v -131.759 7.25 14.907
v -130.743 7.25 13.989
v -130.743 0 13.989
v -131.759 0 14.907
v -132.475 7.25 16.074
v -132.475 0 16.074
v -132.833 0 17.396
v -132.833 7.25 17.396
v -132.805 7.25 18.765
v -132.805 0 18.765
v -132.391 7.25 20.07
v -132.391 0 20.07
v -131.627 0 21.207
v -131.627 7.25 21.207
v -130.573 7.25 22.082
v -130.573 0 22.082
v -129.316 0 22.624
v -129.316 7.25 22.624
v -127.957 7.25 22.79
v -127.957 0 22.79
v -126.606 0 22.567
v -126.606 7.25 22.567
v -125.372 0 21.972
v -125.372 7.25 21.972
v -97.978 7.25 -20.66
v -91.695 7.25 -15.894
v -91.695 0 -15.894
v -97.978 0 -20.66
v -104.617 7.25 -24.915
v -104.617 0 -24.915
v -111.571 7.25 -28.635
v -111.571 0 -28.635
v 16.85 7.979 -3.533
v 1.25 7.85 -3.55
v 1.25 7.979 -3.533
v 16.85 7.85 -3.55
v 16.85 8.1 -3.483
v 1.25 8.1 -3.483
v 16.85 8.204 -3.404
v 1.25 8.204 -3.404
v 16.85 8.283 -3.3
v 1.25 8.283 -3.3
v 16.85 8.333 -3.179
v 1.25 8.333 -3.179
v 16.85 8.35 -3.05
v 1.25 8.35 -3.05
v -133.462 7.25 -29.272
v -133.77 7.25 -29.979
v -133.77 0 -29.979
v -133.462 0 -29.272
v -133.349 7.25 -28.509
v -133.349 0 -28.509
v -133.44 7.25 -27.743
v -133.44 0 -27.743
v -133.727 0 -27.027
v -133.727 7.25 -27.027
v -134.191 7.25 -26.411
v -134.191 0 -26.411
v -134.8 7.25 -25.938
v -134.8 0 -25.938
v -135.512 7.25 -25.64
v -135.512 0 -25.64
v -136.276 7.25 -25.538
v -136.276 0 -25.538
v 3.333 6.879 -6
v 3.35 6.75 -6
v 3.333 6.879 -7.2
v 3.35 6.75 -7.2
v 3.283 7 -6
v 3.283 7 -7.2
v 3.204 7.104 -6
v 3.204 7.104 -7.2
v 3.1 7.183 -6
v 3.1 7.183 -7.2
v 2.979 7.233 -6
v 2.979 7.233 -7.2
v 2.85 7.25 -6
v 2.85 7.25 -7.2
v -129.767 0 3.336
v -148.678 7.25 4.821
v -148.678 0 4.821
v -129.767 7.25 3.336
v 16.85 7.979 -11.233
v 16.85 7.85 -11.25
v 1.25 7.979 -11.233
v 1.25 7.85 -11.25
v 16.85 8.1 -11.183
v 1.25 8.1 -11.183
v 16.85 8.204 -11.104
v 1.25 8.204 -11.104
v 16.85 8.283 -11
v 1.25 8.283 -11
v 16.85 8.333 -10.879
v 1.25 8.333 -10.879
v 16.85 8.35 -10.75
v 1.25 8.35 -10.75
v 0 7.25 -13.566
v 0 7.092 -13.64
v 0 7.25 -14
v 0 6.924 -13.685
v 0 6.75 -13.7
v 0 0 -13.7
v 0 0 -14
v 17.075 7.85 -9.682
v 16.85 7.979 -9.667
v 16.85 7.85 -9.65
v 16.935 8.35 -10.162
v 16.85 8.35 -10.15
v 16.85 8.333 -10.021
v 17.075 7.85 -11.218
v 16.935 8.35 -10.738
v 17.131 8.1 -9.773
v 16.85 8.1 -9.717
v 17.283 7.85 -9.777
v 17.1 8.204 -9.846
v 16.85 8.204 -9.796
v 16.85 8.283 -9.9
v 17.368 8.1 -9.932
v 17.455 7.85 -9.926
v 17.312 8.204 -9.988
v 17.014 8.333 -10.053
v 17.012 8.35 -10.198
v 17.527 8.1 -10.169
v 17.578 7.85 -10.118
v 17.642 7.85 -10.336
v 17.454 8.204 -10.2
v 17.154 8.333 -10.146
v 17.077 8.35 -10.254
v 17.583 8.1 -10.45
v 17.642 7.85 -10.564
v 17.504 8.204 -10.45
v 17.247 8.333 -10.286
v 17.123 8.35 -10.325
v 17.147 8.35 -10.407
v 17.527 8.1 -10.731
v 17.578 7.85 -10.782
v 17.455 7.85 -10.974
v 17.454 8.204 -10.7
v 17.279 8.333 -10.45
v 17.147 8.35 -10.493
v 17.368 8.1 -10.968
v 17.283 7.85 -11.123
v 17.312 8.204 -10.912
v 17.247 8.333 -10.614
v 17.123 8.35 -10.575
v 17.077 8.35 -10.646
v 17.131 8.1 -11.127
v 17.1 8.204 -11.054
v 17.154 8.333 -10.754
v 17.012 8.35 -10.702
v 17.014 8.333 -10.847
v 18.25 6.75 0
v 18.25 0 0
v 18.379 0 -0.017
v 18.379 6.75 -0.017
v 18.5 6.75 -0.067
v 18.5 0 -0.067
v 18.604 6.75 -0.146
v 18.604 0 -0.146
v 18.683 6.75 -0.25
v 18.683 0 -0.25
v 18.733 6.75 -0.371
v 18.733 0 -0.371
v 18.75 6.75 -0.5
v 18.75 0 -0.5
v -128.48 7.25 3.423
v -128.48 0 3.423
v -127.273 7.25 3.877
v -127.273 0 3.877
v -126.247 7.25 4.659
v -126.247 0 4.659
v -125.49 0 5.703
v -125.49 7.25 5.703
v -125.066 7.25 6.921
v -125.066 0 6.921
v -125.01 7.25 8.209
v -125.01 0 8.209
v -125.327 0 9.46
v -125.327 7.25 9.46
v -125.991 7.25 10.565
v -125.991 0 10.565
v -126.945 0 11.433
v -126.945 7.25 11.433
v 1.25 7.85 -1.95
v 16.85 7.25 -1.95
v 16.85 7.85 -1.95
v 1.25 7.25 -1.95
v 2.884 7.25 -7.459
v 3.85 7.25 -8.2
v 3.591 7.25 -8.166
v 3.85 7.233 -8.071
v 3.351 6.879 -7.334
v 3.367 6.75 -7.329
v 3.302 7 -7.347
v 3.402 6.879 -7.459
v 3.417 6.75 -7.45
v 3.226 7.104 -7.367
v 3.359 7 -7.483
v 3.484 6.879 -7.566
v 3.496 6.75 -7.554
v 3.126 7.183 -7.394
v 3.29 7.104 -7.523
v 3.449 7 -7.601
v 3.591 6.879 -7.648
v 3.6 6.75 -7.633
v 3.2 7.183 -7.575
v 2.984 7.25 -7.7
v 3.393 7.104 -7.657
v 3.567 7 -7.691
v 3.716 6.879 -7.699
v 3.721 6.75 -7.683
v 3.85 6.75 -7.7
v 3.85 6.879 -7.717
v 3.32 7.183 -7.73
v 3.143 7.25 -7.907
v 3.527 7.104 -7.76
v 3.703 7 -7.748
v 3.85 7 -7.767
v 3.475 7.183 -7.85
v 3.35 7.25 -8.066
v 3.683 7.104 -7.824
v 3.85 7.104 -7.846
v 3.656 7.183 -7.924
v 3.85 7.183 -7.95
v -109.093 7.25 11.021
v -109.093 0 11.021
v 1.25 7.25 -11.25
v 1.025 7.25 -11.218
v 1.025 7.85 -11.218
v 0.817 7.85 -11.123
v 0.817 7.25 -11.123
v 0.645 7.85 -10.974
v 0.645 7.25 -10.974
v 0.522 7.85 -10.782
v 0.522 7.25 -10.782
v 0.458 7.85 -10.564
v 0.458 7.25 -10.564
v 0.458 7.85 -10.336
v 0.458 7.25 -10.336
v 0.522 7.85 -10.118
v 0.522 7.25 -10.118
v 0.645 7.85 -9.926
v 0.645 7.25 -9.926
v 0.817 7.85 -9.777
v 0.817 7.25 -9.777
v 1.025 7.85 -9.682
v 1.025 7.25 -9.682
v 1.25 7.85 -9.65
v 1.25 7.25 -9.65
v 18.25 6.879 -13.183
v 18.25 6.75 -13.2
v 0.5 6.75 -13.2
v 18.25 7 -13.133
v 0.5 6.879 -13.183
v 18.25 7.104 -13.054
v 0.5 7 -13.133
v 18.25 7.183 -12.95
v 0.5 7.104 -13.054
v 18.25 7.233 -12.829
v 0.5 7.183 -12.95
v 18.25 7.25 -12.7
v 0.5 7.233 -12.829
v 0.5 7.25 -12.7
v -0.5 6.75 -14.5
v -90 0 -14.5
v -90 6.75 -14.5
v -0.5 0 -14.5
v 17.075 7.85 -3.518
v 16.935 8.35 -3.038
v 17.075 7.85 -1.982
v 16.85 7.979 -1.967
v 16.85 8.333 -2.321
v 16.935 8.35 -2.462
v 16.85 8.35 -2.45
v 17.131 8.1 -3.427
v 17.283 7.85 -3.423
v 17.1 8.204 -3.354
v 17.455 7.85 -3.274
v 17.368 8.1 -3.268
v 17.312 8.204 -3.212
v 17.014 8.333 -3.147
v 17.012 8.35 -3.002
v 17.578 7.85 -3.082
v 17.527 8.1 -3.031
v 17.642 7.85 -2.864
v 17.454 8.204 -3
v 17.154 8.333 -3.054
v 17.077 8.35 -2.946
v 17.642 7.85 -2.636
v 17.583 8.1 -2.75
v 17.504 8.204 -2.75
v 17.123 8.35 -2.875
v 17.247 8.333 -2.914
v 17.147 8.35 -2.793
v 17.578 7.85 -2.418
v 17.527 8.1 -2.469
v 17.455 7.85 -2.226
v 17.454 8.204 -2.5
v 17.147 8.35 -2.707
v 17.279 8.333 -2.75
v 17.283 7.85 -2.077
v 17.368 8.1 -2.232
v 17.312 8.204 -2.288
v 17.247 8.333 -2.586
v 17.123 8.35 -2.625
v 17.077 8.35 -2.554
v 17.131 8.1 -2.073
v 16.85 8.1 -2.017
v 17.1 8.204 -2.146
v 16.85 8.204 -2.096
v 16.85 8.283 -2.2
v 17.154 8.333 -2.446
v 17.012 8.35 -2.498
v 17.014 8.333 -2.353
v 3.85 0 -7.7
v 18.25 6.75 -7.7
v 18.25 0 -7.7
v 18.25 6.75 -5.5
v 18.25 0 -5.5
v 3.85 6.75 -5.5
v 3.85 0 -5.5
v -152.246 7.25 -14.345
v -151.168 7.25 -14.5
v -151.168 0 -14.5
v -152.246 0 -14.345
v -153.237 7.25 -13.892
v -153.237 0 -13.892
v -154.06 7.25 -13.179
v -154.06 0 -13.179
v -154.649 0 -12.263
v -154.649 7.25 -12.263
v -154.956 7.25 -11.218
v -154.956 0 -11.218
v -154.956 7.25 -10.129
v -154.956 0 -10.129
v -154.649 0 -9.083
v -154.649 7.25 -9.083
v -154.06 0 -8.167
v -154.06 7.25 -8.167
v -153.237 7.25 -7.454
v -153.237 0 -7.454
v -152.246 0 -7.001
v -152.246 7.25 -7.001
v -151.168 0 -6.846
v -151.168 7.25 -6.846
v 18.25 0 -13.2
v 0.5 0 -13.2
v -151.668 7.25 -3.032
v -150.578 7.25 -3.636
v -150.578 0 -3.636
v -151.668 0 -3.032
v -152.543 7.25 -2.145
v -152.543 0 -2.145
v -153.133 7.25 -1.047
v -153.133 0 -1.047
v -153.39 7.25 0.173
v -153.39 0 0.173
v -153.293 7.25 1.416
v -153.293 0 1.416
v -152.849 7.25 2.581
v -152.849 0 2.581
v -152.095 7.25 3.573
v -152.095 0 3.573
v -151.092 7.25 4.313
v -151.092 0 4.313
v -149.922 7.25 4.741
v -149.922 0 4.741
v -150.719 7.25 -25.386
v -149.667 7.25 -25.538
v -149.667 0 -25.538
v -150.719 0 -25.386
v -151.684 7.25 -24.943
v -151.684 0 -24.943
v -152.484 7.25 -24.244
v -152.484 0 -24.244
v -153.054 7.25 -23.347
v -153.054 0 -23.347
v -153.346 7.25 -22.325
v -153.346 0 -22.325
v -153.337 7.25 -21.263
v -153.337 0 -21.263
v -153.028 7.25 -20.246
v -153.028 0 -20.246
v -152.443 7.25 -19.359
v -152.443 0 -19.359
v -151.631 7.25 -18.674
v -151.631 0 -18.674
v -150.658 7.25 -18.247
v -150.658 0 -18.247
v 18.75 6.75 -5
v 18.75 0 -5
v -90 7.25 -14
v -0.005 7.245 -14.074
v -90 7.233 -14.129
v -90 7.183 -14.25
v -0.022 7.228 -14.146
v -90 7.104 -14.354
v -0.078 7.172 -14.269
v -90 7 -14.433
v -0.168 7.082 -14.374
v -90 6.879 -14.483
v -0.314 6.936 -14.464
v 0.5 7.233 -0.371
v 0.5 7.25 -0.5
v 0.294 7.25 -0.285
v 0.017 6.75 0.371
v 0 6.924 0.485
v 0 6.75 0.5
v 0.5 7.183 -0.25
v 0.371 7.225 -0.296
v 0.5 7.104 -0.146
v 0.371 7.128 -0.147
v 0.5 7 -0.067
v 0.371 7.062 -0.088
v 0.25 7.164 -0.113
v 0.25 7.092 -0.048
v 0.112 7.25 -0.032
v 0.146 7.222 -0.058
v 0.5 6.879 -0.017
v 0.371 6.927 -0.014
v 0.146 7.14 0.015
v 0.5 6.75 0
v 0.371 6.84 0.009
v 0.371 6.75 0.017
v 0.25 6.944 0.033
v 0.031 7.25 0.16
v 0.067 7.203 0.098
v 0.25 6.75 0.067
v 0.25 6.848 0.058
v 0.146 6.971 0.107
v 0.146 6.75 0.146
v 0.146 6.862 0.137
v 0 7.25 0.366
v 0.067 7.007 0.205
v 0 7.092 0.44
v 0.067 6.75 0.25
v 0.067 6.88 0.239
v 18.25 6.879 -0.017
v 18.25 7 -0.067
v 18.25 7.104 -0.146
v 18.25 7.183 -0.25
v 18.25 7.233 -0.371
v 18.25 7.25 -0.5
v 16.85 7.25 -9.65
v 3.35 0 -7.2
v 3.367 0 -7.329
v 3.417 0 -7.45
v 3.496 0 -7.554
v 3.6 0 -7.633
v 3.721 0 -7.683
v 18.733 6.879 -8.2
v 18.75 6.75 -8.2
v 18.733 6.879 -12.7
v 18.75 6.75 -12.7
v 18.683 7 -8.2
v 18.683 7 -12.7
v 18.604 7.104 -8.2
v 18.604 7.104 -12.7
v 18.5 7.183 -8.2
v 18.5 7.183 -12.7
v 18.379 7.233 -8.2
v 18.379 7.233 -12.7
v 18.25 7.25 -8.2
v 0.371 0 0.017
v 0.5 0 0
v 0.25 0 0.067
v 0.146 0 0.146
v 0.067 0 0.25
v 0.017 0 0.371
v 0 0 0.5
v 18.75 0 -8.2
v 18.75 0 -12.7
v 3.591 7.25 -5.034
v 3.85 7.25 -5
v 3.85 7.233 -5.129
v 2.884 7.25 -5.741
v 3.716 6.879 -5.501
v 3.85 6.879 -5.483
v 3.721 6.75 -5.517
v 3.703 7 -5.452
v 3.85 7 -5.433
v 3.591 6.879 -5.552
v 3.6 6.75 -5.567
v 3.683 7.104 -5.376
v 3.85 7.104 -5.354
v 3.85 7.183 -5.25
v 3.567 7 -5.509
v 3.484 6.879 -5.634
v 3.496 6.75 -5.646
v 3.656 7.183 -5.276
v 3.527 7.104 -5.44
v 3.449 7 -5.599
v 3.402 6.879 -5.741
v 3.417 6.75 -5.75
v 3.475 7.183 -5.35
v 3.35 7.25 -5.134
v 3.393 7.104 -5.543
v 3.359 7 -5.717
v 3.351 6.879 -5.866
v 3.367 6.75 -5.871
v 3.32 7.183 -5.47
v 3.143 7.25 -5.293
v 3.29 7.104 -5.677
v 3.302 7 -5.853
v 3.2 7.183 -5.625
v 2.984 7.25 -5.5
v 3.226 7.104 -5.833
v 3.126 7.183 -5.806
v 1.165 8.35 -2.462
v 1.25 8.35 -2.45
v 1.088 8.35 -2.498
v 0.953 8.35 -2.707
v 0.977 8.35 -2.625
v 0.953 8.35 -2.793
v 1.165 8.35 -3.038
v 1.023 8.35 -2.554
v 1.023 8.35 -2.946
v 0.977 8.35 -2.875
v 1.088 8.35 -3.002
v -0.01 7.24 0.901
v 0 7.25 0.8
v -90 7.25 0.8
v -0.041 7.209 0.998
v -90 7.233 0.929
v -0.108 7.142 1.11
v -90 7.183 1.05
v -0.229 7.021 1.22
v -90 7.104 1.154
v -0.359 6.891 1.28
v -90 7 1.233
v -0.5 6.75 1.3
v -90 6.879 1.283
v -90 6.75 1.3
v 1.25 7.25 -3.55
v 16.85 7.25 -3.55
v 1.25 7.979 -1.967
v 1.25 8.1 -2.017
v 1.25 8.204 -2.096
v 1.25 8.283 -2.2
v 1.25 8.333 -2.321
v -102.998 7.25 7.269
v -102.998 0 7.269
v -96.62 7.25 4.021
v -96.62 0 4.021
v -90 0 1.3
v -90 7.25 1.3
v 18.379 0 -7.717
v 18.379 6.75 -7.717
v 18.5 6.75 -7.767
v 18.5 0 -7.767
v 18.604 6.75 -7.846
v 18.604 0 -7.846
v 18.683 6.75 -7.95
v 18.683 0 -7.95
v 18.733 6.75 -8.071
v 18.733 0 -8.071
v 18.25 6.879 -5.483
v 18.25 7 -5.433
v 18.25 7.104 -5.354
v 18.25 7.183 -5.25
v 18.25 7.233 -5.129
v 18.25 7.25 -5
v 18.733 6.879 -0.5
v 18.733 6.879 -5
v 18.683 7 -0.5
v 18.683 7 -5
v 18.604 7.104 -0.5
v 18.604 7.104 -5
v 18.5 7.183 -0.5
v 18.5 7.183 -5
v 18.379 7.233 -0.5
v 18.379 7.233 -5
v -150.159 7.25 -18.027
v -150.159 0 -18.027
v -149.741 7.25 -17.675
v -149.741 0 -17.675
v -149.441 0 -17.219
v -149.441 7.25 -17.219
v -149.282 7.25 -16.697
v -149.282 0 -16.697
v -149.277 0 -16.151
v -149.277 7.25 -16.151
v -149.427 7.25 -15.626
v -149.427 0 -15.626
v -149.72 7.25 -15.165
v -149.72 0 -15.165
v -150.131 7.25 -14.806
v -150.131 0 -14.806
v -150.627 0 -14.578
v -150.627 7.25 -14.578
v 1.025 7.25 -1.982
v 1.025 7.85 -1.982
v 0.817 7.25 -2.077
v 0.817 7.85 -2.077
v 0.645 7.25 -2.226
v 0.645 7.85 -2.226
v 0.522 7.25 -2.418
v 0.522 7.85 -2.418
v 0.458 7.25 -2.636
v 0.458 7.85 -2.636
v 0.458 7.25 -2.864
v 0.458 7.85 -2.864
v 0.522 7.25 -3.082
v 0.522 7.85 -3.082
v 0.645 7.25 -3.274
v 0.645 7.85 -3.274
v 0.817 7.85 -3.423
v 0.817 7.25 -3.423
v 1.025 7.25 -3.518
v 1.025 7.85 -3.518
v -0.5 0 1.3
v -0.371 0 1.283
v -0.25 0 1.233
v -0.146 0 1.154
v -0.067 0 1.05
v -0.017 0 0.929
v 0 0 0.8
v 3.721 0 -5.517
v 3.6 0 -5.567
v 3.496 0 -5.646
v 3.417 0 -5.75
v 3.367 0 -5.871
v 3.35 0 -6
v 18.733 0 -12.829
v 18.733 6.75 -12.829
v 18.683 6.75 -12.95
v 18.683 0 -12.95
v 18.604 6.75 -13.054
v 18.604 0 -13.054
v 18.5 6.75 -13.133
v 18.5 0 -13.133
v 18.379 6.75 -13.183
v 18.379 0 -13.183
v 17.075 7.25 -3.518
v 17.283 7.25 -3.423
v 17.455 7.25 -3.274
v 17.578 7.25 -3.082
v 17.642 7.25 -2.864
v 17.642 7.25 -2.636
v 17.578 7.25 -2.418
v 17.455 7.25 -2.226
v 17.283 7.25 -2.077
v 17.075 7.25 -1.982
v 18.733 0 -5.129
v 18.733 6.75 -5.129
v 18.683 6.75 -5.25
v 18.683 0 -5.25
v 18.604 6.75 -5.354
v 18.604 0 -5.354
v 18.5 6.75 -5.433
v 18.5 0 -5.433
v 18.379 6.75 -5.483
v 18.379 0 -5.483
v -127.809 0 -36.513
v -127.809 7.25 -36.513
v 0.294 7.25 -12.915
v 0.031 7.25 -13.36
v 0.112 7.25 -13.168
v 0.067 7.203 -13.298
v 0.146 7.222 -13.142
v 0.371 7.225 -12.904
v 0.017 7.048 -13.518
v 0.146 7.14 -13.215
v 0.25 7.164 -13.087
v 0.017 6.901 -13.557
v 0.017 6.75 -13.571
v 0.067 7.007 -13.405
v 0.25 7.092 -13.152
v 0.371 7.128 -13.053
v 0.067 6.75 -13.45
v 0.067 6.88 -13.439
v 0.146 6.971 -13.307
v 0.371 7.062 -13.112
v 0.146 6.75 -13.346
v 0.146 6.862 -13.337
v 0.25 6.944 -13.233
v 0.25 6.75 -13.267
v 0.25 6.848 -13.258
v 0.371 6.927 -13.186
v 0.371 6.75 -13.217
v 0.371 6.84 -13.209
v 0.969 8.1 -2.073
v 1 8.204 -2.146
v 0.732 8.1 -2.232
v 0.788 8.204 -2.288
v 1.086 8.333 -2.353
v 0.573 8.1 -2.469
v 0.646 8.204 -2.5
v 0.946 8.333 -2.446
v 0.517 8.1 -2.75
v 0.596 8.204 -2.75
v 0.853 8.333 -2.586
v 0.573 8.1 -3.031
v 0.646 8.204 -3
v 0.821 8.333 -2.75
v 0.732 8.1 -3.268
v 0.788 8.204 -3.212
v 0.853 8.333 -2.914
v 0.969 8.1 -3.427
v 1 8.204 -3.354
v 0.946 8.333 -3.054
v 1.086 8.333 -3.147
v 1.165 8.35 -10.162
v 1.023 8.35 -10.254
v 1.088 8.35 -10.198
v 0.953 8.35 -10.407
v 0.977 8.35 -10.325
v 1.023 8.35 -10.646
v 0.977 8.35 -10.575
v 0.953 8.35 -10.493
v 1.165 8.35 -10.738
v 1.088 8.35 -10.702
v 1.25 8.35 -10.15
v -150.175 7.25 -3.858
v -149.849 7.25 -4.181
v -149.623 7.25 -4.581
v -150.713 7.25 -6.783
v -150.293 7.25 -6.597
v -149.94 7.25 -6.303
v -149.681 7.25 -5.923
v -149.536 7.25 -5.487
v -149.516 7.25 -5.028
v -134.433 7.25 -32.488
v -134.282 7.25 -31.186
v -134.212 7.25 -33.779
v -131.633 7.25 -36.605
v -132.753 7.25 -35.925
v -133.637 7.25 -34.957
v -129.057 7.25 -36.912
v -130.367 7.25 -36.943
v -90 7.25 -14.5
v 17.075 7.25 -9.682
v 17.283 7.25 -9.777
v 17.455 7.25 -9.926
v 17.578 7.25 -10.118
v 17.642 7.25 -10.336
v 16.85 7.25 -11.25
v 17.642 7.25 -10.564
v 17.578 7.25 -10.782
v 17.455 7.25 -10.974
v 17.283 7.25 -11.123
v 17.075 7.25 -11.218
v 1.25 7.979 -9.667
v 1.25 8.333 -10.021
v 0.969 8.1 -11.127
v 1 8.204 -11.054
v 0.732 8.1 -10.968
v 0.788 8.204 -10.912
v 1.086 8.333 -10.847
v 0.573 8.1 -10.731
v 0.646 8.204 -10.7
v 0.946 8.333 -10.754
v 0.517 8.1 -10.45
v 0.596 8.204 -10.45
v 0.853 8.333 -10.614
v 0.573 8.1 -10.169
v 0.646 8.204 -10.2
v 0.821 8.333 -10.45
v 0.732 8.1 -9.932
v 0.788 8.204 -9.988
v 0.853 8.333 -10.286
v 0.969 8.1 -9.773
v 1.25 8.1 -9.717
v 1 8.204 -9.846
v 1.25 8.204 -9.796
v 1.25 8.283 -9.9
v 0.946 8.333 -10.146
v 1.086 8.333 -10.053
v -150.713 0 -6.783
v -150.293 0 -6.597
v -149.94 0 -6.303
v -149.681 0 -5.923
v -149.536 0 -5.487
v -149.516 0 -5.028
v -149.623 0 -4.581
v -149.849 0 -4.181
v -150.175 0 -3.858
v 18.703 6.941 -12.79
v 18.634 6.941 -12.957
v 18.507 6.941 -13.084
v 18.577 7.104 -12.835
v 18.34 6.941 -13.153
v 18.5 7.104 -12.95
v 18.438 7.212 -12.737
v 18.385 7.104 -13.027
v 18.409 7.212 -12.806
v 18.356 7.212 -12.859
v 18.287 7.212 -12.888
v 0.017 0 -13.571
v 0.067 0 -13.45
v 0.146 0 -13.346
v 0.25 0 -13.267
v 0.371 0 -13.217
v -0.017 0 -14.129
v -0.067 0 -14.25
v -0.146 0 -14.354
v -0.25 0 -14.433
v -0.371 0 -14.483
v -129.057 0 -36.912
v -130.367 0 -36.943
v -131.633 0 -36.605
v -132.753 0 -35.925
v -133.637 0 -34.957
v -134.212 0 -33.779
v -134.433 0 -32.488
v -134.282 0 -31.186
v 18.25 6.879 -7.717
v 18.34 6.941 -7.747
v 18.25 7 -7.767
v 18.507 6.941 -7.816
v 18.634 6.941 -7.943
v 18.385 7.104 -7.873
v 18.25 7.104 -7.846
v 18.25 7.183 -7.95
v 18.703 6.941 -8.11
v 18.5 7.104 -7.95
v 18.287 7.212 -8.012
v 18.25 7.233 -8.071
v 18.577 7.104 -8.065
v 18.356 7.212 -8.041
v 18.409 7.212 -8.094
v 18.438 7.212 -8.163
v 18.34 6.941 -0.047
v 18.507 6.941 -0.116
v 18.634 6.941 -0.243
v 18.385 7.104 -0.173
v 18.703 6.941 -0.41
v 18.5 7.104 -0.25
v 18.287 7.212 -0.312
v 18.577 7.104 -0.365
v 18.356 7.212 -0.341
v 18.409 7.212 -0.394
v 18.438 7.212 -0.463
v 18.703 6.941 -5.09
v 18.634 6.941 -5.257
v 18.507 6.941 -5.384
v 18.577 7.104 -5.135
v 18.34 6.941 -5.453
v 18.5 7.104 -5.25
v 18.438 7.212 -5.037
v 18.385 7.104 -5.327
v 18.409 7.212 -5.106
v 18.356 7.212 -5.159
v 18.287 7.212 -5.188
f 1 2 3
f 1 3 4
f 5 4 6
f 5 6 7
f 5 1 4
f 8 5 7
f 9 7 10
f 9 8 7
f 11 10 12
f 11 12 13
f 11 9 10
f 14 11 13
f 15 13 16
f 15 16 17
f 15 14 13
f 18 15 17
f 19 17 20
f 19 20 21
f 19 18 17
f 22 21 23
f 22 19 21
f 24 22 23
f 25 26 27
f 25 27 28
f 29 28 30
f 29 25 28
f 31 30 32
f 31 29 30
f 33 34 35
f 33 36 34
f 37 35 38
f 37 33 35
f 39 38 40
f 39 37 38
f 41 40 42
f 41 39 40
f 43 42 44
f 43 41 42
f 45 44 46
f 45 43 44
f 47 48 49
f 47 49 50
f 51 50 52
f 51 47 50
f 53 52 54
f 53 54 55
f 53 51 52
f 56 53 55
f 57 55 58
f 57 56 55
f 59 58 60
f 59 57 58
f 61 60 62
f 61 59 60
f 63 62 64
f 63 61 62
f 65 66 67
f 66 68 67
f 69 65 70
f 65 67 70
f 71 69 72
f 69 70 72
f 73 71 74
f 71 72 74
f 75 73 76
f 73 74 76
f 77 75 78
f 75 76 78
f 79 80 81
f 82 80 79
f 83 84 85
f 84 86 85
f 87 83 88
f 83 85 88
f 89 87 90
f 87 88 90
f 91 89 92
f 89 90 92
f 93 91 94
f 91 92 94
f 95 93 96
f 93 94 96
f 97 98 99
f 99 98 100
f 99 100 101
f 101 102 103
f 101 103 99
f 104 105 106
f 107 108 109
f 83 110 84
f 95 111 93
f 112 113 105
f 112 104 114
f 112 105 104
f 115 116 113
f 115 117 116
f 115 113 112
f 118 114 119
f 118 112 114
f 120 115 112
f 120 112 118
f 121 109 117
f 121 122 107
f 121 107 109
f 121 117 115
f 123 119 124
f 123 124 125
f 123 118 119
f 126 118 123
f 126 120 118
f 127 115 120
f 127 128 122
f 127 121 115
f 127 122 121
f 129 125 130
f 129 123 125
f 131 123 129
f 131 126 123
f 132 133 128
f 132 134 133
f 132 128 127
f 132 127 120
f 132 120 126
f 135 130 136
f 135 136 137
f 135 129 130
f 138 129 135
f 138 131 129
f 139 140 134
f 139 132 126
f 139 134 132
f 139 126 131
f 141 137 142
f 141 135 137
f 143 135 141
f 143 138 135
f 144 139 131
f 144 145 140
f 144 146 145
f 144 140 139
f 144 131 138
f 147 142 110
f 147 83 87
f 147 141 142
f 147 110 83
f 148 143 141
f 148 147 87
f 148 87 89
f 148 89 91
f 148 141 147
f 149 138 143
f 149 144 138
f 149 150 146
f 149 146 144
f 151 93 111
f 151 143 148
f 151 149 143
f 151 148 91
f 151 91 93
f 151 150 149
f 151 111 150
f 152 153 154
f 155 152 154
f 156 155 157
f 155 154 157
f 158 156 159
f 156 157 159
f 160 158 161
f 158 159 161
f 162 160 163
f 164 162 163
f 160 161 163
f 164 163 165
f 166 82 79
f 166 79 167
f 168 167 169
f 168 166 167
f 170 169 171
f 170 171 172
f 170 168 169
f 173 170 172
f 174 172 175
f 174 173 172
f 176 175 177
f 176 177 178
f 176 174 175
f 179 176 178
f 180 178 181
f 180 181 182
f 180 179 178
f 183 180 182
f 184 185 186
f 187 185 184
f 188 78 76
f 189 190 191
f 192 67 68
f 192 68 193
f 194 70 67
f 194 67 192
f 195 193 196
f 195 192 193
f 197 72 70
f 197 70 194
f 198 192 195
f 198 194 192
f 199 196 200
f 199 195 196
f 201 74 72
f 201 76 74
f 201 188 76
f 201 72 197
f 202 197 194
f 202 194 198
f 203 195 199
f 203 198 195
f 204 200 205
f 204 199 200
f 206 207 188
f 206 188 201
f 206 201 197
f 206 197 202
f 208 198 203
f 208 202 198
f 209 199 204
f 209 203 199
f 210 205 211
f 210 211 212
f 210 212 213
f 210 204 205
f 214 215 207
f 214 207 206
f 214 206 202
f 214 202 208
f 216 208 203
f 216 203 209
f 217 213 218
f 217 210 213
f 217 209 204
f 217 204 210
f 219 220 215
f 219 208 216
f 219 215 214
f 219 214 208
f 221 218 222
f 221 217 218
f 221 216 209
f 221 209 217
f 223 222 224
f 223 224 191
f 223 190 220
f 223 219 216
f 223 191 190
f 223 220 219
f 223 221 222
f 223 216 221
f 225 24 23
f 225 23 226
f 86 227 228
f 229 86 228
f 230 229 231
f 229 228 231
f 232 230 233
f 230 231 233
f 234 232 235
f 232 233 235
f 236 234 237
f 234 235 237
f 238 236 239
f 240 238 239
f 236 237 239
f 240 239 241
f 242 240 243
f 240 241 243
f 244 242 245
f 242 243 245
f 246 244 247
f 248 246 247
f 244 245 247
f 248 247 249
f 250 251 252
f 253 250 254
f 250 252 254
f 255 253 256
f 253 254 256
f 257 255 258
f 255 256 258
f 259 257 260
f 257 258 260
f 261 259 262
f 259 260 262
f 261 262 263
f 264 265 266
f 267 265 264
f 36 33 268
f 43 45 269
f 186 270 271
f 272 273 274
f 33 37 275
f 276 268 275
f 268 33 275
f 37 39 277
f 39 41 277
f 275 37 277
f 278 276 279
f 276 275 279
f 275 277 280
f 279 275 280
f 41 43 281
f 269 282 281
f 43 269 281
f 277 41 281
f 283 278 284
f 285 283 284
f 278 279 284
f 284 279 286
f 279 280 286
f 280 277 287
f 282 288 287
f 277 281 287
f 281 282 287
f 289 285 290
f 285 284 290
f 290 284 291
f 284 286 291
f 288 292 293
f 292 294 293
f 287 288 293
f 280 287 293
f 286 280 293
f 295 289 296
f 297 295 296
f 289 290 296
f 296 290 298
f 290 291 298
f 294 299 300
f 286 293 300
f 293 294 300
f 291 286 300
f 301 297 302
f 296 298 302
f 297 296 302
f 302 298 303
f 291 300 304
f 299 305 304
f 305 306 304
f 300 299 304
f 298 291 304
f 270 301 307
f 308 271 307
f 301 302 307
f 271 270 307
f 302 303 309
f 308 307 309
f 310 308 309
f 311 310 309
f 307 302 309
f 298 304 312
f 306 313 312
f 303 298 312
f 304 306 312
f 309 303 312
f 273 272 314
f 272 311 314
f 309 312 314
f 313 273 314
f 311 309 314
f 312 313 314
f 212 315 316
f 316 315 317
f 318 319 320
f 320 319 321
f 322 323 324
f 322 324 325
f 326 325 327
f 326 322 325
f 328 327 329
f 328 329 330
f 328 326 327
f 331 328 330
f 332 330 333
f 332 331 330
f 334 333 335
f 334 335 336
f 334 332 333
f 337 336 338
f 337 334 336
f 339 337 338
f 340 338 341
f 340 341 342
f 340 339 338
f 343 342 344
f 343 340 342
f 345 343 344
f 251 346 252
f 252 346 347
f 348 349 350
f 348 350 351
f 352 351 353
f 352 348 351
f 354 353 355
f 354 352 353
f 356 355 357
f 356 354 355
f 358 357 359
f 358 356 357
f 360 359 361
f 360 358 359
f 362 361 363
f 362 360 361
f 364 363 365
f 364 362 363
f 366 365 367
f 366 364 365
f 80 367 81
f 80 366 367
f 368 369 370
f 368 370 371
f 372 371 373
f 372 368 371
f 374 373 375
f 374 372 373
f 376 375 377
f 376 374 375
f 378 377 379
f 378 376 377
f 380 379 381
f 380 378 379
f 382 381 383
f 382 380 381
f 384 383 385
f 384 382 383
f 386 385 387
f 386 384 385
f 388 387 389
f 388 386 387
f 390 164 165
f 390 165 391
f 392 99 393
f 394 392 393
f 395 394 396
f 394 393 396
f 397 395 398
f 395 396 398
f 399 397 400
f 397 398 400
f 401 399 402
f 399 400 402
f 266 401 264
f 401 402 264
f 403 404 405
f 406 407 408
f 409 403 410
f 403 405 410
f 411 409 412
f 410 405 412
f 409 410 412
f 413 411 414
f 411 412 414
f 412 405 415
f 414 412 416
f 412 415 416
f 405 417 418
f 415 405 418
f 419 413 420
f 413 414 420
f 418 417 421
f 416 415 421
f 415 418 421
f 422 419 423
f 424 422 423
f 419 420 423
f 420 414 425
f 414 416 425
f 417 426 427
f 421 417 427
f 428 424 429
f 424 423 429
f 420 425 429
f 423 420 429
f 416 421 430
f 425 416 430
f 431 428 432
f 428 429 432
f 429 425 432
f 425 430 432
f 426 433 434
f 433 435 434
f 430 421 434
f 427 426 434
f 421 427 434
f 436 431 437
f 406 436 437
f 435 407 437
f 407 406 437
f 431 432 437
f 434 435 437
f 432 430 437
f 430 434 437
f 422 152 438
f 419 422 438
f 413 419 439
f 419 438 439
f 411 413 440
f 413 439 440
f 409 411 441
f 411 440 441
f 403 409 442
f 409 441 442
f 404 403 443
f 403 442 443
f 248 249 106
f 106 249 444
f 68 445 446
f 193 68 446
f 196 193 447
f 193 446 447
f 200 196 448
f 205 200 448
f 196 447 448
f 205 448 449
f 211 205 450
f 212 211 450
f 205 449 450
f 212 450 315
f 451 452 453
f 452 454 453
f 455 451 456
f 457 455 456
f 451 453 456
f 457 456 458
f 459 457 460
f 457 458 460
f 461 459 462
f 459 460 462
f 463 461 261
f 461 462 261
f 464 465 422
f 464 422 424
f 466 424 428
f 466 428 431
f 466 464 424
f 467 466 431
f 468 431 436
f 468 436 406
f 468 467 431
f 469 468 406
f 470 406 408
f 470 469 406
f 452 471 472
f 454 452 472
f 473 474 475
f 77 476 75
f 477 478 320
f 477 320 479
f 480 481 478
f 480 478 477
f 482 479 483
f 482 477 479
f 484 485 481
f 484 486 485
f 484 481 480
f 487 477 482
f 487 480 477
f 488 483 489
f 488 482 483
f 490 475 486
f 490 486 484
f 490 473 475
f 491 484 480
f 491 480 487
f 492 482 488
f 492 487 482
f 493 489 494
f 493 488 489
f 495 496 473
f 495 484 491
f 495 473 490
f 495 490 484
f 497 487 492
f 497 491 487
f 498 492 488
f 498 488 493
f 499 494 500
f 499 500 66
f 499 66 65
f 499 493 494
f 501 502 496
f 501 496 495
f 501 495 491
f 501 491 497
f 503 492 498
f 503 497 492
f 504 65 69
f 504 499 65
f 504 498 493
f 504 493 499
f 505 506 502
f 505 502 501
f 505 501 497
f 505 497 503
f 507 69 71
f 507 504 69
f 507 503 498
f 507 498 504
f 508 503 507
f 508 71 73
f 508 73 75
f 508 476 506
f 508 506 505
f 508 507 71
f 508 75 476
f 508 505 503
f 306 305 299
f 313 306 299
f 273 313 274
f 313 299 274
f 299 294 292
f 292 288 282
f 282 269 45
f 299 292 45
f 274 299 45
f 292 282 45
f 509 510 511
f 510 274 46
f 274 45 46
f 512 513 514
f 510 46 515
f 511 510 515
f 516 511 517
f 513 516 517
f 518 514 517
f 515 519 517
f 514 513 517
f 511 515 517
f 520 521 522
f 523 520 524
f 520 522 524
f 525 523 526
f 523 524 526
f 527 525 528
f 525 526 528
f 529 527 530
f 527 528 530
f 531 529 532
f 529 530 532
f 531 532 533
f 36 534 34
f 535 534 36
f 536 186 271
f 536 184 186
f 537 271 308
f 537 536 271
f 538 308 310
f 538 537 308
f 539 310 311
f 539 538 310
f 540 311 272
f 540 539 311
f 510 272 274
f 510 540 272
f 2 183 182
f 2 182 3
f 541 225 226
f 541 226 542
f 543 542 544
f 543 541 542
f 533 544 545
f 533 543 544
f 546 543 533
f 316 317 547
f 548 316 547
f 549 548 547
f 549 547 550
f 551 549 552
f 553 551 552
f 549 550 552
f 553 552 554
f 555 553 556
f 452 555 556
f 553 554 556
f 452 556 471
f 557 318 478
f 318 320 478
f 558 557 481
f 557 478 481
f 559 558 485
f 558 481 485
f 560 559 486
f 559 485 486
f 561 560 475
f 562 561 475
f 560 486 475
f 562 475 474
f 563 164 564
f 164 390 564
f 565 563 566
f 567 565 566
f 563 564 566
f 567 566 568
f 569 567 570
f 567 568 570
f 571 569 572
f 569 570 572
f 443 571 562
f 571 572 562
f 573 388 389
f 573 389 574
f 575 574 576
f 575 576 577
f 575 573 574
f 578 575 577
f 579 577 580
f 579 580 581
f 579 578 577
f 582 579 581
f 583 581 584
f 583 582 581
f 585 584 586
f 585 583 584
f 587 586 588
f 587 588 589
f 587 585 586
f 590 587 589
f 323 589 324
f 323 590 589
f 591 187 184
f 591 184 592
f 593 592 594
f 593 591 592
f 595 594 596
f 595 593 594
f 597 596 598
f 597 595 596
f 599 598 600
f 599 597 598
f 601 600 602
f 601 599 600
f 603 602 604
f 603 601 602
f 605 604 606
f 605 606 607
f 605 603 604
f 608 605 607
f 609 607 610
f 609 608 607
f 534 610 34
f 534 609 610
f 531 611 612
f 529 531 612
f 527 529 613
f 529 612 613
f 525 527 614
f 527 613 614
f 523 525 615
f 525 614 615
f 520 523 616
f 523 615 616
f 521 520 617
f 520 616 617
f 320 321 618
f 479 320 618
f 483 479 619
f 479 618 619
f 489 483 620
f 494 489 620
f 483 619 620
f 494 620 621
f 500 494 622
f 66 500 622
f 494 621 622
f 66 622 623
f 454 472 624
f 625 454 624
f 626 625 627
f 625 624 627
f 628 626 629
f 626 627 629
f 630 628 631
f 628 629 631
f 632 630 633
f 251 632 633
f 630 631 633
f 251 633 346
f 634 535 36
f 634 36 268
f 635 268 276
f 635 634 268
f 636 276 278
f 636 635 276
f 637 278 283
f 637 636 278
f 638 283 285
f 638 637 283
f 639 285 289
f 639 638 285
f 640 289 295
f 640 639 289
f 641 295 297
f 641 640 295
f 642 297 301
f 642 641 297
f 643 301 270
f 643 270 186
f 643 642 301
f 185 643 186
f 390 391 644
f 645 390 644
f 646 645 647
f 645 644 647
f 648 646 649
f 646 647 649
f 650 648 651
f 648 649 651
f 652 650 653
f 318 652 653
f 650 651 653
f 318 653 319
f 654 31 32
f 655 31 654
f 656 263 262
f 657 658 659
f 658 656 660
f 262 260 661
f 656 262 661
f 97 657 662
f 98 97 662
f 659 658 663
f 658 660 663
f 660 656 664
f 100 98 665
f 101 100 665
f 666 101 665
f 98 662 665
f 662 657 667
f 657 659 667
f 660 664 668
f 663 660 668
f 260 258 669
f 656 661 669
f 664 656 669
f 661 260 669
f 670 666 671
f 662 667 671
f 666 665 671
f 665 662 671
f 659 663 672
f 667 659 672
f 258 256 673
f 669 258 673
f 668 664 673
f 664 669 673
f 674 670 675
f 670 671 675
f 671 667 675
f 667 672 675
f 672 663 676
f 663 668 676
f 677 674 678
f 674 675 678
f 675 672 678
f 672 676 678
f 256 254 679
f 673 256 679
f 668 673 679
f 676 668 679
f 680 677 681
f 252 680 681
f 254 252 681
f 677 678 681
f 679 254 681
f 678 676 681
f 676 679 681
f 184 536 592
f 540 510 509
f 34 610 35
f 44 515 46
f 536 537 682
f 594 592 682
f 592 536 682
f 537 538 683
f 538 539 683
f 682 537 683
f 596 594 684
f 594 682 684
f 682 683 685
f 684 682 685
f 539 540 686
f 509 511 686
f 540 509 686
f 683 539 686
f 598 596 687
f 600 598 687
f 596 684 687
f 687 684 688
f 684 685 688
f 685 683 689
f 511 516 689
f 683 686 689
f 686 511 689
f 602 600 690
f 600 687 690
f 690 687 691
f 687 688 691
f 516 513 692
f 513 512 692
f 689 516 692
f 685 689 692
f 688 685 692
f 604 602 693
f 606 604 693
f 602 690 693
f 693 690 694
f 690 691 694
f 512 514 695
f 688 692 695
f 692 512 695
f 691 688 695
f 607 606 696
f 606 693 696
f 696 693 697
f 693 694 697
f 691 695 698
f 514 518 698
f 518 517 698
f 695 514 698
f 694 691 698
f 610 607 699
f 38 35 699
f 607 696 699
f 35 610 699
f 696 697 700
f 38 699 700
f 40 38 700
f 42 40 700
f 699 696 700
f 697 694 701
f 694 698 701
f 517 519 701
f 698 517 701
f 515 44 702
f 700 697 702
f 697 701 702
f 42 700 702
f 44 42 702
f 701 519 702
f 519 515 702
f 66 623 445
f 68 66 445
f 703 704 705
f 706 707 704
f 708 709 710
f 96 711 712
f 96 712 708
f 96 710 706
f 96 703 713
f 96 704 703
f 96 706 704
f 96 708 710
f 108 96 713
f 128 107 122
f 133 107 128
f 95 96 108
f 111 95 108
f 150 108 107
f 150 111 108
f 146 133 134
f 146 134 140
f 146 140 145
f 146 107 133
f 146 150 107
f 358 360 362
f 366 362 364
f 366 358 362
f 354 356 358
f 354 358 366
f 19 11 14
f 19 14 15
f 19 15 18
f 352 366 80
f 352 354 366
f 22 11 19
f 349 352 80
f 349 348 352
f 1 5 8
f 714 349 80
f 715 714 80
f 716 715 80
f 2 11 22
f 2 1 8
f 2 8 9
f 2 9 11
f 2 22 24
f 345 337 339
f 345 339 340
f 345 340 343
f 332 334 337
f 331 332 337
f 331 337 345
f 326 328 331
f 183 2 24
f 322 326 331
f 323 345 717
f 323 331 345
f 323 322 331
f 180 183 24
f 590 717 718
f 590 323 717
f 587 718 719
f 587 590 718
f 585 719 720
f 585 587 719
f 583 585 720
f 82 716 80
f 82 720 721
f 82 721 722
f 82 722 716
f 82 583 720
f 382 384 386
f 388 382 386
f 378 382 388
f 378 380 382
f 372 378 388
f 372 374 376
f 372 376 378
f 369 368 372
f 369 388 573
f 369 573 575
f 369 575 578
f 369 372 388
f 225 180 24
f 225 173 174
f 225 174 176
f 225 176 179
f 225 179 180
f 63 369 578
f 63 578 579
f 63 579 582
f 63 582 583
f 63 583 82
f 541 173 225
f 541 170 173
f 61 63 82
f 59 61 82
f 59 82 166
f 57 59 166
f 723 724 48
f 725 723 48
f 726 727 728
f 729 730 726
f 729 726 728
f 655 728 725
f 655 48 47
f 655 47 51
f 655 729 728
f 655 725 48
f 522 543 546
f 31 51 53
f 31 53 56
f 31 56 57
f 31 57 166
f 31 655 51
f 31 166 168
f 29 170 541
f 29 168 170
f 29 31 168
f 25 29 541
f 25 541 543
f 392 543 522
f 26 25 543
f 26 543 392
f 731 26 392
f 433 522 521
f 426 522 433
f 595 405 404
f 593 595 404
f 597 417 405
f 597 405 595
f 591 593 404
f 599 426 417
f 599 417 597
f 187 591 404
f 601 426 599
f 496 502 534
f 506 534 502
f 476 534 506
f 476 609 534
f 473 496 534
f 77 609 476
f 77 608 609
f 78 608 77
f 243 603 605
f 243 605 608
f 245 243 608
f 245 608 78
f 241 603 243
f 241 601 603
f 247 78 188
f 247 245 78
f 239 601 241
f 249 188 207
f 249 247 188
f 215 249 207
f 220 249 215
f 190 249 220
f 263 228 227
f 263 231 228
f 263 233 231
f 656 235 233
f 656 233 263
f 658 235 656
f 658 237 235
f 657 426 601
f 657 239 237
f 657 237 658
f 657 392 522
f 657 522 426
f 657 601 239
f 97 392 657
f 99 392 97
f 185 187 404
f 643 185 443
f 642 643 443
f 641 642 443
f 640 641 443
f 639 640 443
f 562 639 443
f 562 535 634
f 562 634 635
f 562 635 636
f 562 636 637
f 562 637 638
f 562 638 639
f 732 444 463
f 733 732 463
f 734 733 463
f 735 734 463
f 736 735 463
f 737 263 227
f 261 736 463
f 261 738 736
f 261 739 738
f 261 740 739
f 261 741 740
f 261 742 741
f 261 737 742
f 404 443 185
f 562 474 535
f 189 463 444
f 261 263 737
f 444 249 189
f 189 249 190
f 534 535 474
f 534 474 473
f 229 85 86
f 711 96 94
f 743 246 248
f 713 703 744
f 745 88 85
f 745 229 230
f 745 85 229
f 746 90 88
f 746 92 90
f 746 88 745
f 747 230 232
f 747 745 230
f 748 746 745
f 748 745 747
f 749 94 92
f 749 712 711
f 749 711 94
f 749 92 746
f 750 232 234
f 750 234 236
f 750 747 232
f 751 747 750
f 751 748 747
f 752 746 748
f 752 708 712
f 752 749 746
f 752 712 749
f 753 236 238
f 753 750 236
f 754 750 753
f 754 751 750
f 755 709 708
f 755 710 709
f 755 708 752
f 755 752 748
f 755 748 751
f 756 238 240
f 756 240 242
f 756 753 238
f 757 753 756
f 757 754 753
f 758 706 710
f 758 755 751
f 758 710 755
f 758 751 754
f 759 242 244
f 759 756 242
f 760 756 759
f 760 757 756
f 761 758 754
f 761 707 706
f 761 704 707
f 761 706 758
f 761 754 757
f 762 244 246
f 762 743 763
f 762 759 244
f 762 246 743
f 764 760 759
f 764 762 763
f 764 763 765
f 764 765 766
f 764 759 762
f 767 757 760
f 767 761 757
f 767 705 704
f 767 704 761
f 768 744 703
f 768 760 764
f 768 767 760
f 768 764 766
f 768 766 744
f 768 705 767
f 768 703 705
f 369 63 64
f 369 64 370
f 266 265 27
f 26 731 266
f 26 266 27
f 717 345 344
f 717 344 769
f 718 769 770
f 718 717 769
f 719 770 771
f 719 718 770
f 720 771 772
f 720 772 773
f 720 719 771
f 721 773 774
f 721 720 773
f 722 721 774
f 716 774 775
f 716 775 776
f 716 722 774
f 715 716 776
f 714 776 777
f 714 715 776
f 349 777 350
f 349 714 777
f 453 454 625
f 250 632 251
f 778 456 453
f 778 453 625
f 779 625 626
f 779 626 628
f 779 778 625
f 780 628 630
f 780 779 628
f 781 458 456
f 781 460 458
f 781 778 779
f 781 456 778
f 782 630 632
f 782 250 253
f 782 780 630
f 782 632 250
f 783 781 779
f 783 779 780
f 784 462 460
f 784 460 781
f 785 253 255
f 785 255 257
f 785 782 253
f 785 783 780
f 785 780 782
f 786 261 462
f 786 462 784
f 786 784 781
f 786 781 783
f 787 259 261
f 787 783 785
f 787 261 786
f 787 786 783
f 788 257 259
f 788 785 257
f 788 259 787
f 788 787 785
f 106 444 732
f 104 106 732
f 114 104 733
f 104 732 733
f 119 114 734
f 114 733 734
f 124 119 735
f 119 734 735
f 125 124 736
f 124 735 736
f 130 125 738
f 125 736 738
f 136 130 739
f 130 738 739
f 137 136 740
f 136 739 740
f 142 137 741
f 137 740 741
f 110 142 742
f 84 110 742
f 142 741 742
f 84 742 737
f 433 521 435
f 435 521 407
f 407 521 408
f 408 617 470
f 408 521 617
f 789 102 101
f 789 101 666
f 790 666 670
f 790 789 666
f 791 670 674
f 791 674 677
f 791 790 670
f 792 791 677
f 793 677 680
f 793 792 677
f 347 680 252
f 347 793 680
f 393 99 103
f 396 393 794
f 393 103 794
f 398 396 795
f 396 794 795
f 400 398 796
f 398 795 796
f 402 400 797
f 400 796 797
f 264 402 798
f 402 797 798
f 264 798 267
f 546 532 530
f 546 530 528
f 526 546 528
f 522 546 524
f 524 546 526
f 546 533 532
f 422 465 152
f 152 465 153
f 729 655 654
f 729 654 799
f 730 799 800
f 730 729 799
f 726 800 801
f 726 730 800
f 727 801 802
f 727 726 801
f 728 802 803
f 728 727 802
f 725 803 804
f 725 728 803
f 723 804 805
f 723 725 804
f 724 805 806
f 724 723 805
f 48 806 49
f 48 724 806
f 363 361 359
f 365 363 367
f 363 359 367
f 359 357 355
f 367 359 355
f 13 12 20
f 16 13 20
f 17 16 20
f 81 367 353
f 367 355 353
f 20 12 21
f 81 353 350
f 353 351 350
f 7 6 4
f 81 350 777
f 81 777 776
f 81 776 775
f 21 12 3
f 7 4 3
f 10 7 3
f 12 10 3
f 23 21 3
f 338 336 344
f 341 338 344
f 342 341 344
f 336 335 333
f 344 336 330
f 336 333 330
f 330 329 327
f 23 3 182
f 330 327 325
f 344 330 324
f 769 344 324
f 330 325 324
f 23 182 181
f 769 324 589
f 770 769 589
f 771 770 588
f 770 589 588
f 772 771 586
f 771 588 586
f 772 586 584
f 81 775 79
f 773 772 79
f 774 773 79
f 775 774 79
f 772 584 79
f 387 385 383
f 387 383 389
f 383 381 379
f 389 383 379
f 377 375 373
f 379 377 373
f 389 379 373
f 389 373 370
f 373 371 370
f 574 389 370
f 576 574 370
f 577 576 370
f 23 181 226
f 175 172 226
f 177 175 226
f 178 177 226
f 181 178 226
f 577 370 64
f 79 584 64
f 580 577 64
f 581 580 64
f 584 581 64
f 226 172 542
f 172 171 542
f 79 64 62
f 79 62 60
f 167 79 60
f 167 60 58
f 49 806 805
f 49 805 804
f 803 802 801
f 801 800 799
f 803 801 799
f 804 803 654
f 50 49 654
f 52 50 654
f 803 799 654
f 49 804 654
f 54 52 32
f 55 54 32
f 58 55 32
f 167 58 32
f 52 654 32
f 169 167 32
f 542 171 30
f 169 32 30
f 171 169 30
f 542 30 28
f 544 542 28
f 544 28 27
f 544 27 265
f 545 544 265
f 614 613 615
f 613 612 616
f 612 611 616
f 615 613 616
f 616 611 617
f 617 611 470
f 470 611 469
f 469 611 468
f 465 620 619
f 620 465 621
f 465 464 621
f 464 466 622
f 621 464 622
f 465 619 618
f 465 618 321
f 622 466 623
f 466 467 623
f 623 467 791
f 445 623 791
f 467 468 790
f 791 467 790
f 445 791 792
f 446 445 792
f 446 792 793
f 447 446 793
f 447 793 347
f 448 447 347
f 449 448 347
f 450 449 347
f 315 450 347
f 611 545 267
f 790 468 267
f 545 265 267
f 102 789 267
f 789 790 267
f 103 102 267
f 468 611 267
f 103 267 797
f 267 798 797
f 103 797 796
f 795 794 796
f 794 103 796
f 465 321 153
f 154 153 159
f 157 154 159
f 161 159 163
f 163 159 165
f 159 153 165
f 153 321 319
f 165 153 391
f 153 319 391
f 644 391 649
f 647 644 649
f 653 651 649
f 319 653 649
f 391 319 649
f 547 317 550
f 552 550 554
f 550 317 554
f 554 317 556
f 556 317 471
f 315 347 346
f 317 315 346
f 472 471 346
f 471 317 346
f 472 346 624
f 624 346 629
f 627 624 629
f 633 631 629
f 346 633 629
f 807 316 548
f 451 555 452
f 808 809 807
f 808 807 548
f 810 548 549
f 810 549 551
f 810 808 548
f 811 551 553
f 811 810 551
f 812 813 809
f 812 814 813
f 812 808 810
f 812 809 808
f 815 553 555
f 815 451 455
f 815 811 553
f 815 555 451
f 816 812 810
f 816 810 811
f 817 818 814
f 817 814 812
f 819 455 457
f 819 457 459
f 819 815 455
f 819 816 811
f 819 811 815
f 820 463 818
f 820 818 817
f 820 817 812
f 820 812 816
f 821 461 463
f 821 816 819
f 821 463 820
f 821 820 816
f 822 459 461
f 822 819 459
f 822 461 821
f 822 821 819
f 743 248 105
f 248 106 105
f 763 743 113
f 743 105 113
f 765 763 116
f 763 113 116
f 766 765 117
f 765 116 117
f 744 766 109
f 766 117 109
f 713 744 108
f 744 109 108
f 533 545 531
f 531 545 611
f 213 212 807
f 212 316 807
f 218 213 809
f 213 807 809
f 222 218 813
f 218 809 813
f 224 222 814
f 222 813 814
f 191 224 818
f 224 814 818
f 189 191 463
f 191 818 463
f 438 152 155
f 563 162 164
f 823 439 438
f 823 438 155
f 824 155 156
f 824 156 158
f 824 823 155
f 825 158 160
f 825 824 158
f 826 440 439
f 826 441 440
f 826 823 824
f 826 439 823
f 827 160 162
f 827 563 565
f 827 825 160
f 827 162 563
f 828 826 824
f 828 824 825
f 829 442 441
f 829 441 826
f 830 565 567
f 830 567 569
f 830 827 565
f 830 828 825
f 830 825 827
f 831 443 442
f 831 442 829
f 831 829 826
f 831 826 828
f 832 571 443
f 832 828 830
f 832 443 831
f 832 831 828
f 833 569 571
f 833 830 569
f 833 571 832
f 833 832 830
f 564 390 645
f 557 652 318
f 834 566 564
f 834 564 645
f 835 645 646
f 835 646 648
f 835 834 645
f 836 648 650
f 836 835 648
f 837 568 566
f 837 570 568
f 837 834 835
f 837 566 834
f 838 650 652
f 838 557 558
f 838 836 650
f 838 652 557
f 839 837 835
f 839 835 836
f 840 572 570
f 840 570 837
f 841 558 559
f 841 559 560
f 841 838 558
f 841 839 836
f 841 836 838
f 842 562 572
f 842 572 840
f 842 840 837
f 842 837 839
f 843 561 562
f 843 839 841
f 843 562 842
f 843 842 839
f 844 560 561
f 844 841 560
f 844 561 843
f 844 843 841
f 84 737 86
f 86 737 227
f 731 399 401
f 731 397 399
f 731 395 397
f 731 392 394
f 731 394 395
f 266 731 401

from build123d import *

# Parameters (mm, degrees)
BOSS_EXTRUDE1_DEPTH = 7.25
BOSS_EXTRUDE2_DEPTH = 1.1
FILLET1_R           = 0.5
SKETCH4_W           = 90
SKETCH4_H           = 15.8
BOSS_EXTRUDE3_DEPTH = 7.25
FILLET3_R           = 0.5
BOSS_EXTRUDE4_DEPTH = 7.25


with BuildPart() as part:
    # Sketch1 → Boss-Extrude1 (new body)
    with BuildSketch(Plane(origin=(0, 0, 0), x_dir=(1, 0, 0), z_dir=(0, 1, 0))):
        with BuildLine():
            Line((0, 0), (18.25, 0))
            ThreePointArc((18.25, 0), (18.603553391, 0.146446609), (18.75, 0.5))
            Line((18.75, 0.5), (18.75, 5))
            ThreePointArc((18.75, 5), (18.603553391, 5.353553391), (18.25, 5.5))
            Line((18.25, 5.5), (3.85, 5.5))
            ThreePointArc((3.85, 5.5), (3.496446609, 5.646446609), (3.35, 6))
            Line((3.35, 6), (3.35, 7.2))
            ThreePointArc((3.35, 7.2), (3.496446609, 7.553553391), (3.85, 7.7))
            Line((3.85, 7.7), (18.25, 7.7))
            ThreePointArc((18.25, 7.7), (18.603553391, 7.846446609), (18.75, 8.2))
            Line((18.75, 8.2), (18.75, 12.7))
            ThreePointArc((18.75, 12.7), (18.603553391, 13.053553391), (18.25, 13.2))
            Line((18.25, 13.2), (0, 13.2))
            Line((0, 13.2), (0, 0))
        make_face()
    extrude(amount=BOSS_EXTRUDE1_DEPTH)

    # Sketch2 → Boss-Extrude2 (add)
    with BuildSketch(Plane(origin=(0, 7.25, 0), x_dir=(1, 0, 0), z_dir=(0, 1, 0))):
        with BuildLine():
            Line((1.25, 3.55), (16.85, 3.55))
            ThreePointArc((16.85, 3.55), (17.65, 2.75), (16.85, 1.95))
            Line((16.85, 1.95), (1.25, 1.95))
            ThreePointArc((1.25, 1.95), (0.45, 2.75), (1.25, 3.55))
        make_face()
        with BuildLine():
            Line((1.25, 9.65), (16.85, 9.65))
            ThreePointArc((16.85, 9.65), (17.65, 10.45), (16.85, 11.25))
            Line((16.85, 11.25), (1.25, 11.25))
            ThreePointArc((1.25, 11.25), (0.45, 10.45), (1.25, 9.65))
        make_face()
    extrude(amount=BOSS_EXTRUDE2_DEPTH)

    # Fillet1
    fillet1_edges = [part.edges().sort_by_distance(p)[0] for p in [
        (18.603553391, 7.25, -0.146446609),
        (18.75, 7.25, -2.75),
        (18.603553391, 7.25, -5.353553391),
        (11.05, 7.25, -5.5),
        (3.496446609, 7.25, -5.646446609),
        (3.35, 7.25, -6.6),
        (3.496446609, 7.25, -7.553553391),
        (11.05, 7.25, -7.7),
        (18.603553391, 7.25, -7.846446609),
        (0.45, 8.35, -2.75),
        (9.05, 8.35, -1.95),
        (17.65, 8.35, -2.75),
        (9.05, 8.35, -3.55),
        (18.75, 7.25, -10.45),
        (18.603553391, 7.25, -13.053553391),
        (9.125, 7.25, -13.2),
        (0.45, 8.35, -10.45),
        (9.05, 8.35, -9.65),
        (17.65, 8.35, -10.45),
        (9.05, 8.35, -11.25),
        (9.125, 7.25, 0),
    ]]
    fillet(fillet1_edges, radius=FILLET1_R)

    # Sketch4 → Boss-Extrude3 (add)
    with BuildSketch(Plane(origin=(0, 0, 0), x_dir=(1, 0, 0), z_dir=(0, 1, 0))):
        with Locations((-45, 6.6)):
            Rectangle(SKETCH4_W, SKETCH4_H)
    extrude(amount=BOSS_EXTRUDE3_DEPTH)

    # Fillet3
    # the kernel refuses this fillet: 0.5 mm, written as the material it adds along each edge
    with BuildSketch(Plane(origin=(0, 0, 0), x_dir=(0, 0, 1), z_dir=(0, 1, 0))) as fillet3_piece_1:
        with BuildLine():
            CenterArc((FILLET3_R, FILLET3_R), FILLET3_R, 180, 90)
            Line((0, FILLET3_R), (0, 0))
            Line((0, 0), (FILLET3_R, 0))
        make_face()
    extrude(amount=6.75)
    with BuildSketch(Plane(origin=(0, 0, -13.2), x_dir=(0, 0, -1), z_dir=(0, 1, 0))) as fillet3_piece_2:
        with BuildLine():
            CenterArc((FILLET3_R, -FILLET3_R), FILLET3_R, 90, 90)
            Line((0, -FILLET3_R), (0, 0))
            Line((0, 0), (FILLET3_R, 0))
        make_face()
    extrude(amount=6.75)
    with BuildSketch(Plane(origin=(0, 6.75, -12.7), x_dir=(0, -0.8017442392976486, 0.5976672776328271), z_dir=(0, -0.5976672776328271, -0.8017442392976486))) as fillet3_piece_3_section:
        with BuildLine():
            CenterArc((0.5 + FILLET3_R, -FILLET3_R), FILLET3_R, 90, 90)
            Line((0.5, -FILLET3_R), (0.5, 0))
            Line((0.5, 0), (0.5 + FILLET3_R, 0))
        make_face()
    fillet3_piece_3 = revolve(axis=Axis((0, 6.75, -12.7), (-1, 0, 0)), revolution_arc=233.296989237, mode=Mode.PRIVATE)
    fillet3_piece_3 = split(fillet3_piece_3, bisect_by=Plane(origin=(0.15581414, 7.25, -13.074969472), z_dir=(0, -1, 0)), keep=Keep.TOP, mode=Mode.PRIVATE)
    add(fillet3_piece_3)
    with BuildSketch(Plane(origin=(0, 6.75, -0.5), x_dir=(0, -0.801744239297648, -0.5976672776328278), z_dir=(0, -0.5976672776328278, 0.801744239297648))) as fillet3_piece_4_section:
        with BuildLine():
            CenterArc((0.5 + FILLET3_R, FILLET3_R), FILLET3_R, 180, 90)
            Line((0.5, FILLET3_R), (0.5, 0))
            Line((0.5, 0), (0.5 + FILLET3_R, 0))
        make_face()
    fillet3_piece_4 = revolve(axis=Axis((0, 6.75, -0.5), (1, 0, 0)), revolution_arc=233.296989237, mode=Mode.PRIVATE)
    fillet3_piece_4 = split(fillet3_piece_4, bisect_by=Plane(origin=(0.155814151, 7.25, -0.125030527), z_dir=(0, -1, 0)), keep=Keep.TOP, mode=Mode.PRIVATE)
    add(fillet3_piece_4)
    # the kernel refuses this fillet: 0.5 mm, written as the material it takes off along each edge
    with BuildSketch(Plane(origin=(0, -1.25, 1.3), x_dir=(0, 0, -1), z_dir=(0, 1, 0))) as fillet3_2_piece_1:
        with BuildLine():
            CenterArc((FILLET3_R, FILLET3_R), FILLET3_R, 180, 90)
            Line((0, FILLET3_R), (0, 0))
            Line((0, 0), (FILLET3_R, 0))
        make_face()
    extrude(amount=9.75, mode=Mode.SUBTRACT)
    with BuildSketch(Plane(origin=(0, -1.25, -14.5), x_dir=(0, 0, 1), z_dir=(0, 1, 0))) as fillet3_2_piece_2:
        with BuildLine():
            CenterArc((FILLET3_R, -FILLET3_R), FILLET3_R, 90, 90)
            Line((0, -FILLET3_R), (0, 0))
            Line((0, 0), (FILLET3_R, 0))
        make_face()
    extrude(amount=9.75, mode=Mode.SUBTRACT)
    with BuildSketch(Plane(origin=(-91.25, 7.25, 1.3), x_dir=(0, 0, -1), z_dir=(1, 0, 0)), Plane(origin=(1.25, 7.25, -14.5), x_dir=(0, 0, 1), z_dir=(-1, 0, 0))) as fillet3_2_piece_3:
        with BuildLine():
            CenterArc((FILLET3_R, -FILLET3_R), FILLET3_R, 90, 90)
            Line((0, -FILLET3_R), (0, 0))
            Line((0, 0), (FILLET3_R, 0))
        make_face()
    extrude(amount=92.5, mode=Mode.SUBTRACT)

    # Sketch5 → Boss-Extrude4 (add)
    with BuildSketch(Plane(origin=(0, 7.25, 0), x_dir=(1, 0, 0), z_dir=(0, 1, 0))):
        with BuildLine():
            Line((-90, 14.5), (-91.694558873, 15.893887447))
            ThreePointArc((-91.694558873, 15.893887447), (-101.255273326, 22.85289034), (-111.570616913, 28.634643431))
            Line((-111.570616913, 28.634643431), (-127.809202797, 36.513023717))
            ThreePointArc((-127.809202797, 36.513023717), (-133.229461338, 35.472077659), (-133.770408027, 29.979341726))
            ThreePointArc((-133.770408027, 29.979341726), (-133.726831866, 27.027184623), (-136.276459546, 25.538383383))
            Line((-136.276459546, 25.538383383), (-149.666955308, 25.538383383))
            ThreePointArc((-149.666955308, 25.538383383), (-153.346325023, 22.325436822), (-150.658389652, 18.246737208))
            ThreePointArc((-150.658389652, 18.246737208), (-149.277221775, 16.150939464), (-151.167827967, 14.5))
            ThreePointArc((-151.167827967, 14.5), (-154.994699417, 10.67312855), (-151.167827967, 6.8462571))
            ThreePointArc((-151.167827967, 6.8462571), (-149.535956381, 5.487012057), (-150.577779387, 3.636294146))
            ThreePointArc((-150.577779387, 3.636294146), (-153.292773274, -1.415823247), (-148.677747615, -4.821204301))
            Line((-148.677747615, -4.821204301), (-129.766646687, -3.335569849))
            ThreePointArc((-129.766646687, -3.335569849), (-125.233182835, -6.296372519), (-126.944947273, -11.433347257))
            Line((-126.944947273, -11.433347257), (-130.743308987, -13.988655394))
            ThreePointArc((-130.743308987, -13.988655394), (-132.049672504, -20.665923892), (-125.372404006, -21.97228741))
            Line((-125.372404006, -21.97228741), (-109.093123035, -11.020571314))
            ThreePointArc((-109.093123035, -11.020571314), (-99.841658682, -5.580656509), (-90, -1.3))
            Line((-90, -1.3), (-90, 14.5))
        make_face()
    extrude(amount=-BOSS_EXTRUDE4_DEPTH)


solid = part.part
